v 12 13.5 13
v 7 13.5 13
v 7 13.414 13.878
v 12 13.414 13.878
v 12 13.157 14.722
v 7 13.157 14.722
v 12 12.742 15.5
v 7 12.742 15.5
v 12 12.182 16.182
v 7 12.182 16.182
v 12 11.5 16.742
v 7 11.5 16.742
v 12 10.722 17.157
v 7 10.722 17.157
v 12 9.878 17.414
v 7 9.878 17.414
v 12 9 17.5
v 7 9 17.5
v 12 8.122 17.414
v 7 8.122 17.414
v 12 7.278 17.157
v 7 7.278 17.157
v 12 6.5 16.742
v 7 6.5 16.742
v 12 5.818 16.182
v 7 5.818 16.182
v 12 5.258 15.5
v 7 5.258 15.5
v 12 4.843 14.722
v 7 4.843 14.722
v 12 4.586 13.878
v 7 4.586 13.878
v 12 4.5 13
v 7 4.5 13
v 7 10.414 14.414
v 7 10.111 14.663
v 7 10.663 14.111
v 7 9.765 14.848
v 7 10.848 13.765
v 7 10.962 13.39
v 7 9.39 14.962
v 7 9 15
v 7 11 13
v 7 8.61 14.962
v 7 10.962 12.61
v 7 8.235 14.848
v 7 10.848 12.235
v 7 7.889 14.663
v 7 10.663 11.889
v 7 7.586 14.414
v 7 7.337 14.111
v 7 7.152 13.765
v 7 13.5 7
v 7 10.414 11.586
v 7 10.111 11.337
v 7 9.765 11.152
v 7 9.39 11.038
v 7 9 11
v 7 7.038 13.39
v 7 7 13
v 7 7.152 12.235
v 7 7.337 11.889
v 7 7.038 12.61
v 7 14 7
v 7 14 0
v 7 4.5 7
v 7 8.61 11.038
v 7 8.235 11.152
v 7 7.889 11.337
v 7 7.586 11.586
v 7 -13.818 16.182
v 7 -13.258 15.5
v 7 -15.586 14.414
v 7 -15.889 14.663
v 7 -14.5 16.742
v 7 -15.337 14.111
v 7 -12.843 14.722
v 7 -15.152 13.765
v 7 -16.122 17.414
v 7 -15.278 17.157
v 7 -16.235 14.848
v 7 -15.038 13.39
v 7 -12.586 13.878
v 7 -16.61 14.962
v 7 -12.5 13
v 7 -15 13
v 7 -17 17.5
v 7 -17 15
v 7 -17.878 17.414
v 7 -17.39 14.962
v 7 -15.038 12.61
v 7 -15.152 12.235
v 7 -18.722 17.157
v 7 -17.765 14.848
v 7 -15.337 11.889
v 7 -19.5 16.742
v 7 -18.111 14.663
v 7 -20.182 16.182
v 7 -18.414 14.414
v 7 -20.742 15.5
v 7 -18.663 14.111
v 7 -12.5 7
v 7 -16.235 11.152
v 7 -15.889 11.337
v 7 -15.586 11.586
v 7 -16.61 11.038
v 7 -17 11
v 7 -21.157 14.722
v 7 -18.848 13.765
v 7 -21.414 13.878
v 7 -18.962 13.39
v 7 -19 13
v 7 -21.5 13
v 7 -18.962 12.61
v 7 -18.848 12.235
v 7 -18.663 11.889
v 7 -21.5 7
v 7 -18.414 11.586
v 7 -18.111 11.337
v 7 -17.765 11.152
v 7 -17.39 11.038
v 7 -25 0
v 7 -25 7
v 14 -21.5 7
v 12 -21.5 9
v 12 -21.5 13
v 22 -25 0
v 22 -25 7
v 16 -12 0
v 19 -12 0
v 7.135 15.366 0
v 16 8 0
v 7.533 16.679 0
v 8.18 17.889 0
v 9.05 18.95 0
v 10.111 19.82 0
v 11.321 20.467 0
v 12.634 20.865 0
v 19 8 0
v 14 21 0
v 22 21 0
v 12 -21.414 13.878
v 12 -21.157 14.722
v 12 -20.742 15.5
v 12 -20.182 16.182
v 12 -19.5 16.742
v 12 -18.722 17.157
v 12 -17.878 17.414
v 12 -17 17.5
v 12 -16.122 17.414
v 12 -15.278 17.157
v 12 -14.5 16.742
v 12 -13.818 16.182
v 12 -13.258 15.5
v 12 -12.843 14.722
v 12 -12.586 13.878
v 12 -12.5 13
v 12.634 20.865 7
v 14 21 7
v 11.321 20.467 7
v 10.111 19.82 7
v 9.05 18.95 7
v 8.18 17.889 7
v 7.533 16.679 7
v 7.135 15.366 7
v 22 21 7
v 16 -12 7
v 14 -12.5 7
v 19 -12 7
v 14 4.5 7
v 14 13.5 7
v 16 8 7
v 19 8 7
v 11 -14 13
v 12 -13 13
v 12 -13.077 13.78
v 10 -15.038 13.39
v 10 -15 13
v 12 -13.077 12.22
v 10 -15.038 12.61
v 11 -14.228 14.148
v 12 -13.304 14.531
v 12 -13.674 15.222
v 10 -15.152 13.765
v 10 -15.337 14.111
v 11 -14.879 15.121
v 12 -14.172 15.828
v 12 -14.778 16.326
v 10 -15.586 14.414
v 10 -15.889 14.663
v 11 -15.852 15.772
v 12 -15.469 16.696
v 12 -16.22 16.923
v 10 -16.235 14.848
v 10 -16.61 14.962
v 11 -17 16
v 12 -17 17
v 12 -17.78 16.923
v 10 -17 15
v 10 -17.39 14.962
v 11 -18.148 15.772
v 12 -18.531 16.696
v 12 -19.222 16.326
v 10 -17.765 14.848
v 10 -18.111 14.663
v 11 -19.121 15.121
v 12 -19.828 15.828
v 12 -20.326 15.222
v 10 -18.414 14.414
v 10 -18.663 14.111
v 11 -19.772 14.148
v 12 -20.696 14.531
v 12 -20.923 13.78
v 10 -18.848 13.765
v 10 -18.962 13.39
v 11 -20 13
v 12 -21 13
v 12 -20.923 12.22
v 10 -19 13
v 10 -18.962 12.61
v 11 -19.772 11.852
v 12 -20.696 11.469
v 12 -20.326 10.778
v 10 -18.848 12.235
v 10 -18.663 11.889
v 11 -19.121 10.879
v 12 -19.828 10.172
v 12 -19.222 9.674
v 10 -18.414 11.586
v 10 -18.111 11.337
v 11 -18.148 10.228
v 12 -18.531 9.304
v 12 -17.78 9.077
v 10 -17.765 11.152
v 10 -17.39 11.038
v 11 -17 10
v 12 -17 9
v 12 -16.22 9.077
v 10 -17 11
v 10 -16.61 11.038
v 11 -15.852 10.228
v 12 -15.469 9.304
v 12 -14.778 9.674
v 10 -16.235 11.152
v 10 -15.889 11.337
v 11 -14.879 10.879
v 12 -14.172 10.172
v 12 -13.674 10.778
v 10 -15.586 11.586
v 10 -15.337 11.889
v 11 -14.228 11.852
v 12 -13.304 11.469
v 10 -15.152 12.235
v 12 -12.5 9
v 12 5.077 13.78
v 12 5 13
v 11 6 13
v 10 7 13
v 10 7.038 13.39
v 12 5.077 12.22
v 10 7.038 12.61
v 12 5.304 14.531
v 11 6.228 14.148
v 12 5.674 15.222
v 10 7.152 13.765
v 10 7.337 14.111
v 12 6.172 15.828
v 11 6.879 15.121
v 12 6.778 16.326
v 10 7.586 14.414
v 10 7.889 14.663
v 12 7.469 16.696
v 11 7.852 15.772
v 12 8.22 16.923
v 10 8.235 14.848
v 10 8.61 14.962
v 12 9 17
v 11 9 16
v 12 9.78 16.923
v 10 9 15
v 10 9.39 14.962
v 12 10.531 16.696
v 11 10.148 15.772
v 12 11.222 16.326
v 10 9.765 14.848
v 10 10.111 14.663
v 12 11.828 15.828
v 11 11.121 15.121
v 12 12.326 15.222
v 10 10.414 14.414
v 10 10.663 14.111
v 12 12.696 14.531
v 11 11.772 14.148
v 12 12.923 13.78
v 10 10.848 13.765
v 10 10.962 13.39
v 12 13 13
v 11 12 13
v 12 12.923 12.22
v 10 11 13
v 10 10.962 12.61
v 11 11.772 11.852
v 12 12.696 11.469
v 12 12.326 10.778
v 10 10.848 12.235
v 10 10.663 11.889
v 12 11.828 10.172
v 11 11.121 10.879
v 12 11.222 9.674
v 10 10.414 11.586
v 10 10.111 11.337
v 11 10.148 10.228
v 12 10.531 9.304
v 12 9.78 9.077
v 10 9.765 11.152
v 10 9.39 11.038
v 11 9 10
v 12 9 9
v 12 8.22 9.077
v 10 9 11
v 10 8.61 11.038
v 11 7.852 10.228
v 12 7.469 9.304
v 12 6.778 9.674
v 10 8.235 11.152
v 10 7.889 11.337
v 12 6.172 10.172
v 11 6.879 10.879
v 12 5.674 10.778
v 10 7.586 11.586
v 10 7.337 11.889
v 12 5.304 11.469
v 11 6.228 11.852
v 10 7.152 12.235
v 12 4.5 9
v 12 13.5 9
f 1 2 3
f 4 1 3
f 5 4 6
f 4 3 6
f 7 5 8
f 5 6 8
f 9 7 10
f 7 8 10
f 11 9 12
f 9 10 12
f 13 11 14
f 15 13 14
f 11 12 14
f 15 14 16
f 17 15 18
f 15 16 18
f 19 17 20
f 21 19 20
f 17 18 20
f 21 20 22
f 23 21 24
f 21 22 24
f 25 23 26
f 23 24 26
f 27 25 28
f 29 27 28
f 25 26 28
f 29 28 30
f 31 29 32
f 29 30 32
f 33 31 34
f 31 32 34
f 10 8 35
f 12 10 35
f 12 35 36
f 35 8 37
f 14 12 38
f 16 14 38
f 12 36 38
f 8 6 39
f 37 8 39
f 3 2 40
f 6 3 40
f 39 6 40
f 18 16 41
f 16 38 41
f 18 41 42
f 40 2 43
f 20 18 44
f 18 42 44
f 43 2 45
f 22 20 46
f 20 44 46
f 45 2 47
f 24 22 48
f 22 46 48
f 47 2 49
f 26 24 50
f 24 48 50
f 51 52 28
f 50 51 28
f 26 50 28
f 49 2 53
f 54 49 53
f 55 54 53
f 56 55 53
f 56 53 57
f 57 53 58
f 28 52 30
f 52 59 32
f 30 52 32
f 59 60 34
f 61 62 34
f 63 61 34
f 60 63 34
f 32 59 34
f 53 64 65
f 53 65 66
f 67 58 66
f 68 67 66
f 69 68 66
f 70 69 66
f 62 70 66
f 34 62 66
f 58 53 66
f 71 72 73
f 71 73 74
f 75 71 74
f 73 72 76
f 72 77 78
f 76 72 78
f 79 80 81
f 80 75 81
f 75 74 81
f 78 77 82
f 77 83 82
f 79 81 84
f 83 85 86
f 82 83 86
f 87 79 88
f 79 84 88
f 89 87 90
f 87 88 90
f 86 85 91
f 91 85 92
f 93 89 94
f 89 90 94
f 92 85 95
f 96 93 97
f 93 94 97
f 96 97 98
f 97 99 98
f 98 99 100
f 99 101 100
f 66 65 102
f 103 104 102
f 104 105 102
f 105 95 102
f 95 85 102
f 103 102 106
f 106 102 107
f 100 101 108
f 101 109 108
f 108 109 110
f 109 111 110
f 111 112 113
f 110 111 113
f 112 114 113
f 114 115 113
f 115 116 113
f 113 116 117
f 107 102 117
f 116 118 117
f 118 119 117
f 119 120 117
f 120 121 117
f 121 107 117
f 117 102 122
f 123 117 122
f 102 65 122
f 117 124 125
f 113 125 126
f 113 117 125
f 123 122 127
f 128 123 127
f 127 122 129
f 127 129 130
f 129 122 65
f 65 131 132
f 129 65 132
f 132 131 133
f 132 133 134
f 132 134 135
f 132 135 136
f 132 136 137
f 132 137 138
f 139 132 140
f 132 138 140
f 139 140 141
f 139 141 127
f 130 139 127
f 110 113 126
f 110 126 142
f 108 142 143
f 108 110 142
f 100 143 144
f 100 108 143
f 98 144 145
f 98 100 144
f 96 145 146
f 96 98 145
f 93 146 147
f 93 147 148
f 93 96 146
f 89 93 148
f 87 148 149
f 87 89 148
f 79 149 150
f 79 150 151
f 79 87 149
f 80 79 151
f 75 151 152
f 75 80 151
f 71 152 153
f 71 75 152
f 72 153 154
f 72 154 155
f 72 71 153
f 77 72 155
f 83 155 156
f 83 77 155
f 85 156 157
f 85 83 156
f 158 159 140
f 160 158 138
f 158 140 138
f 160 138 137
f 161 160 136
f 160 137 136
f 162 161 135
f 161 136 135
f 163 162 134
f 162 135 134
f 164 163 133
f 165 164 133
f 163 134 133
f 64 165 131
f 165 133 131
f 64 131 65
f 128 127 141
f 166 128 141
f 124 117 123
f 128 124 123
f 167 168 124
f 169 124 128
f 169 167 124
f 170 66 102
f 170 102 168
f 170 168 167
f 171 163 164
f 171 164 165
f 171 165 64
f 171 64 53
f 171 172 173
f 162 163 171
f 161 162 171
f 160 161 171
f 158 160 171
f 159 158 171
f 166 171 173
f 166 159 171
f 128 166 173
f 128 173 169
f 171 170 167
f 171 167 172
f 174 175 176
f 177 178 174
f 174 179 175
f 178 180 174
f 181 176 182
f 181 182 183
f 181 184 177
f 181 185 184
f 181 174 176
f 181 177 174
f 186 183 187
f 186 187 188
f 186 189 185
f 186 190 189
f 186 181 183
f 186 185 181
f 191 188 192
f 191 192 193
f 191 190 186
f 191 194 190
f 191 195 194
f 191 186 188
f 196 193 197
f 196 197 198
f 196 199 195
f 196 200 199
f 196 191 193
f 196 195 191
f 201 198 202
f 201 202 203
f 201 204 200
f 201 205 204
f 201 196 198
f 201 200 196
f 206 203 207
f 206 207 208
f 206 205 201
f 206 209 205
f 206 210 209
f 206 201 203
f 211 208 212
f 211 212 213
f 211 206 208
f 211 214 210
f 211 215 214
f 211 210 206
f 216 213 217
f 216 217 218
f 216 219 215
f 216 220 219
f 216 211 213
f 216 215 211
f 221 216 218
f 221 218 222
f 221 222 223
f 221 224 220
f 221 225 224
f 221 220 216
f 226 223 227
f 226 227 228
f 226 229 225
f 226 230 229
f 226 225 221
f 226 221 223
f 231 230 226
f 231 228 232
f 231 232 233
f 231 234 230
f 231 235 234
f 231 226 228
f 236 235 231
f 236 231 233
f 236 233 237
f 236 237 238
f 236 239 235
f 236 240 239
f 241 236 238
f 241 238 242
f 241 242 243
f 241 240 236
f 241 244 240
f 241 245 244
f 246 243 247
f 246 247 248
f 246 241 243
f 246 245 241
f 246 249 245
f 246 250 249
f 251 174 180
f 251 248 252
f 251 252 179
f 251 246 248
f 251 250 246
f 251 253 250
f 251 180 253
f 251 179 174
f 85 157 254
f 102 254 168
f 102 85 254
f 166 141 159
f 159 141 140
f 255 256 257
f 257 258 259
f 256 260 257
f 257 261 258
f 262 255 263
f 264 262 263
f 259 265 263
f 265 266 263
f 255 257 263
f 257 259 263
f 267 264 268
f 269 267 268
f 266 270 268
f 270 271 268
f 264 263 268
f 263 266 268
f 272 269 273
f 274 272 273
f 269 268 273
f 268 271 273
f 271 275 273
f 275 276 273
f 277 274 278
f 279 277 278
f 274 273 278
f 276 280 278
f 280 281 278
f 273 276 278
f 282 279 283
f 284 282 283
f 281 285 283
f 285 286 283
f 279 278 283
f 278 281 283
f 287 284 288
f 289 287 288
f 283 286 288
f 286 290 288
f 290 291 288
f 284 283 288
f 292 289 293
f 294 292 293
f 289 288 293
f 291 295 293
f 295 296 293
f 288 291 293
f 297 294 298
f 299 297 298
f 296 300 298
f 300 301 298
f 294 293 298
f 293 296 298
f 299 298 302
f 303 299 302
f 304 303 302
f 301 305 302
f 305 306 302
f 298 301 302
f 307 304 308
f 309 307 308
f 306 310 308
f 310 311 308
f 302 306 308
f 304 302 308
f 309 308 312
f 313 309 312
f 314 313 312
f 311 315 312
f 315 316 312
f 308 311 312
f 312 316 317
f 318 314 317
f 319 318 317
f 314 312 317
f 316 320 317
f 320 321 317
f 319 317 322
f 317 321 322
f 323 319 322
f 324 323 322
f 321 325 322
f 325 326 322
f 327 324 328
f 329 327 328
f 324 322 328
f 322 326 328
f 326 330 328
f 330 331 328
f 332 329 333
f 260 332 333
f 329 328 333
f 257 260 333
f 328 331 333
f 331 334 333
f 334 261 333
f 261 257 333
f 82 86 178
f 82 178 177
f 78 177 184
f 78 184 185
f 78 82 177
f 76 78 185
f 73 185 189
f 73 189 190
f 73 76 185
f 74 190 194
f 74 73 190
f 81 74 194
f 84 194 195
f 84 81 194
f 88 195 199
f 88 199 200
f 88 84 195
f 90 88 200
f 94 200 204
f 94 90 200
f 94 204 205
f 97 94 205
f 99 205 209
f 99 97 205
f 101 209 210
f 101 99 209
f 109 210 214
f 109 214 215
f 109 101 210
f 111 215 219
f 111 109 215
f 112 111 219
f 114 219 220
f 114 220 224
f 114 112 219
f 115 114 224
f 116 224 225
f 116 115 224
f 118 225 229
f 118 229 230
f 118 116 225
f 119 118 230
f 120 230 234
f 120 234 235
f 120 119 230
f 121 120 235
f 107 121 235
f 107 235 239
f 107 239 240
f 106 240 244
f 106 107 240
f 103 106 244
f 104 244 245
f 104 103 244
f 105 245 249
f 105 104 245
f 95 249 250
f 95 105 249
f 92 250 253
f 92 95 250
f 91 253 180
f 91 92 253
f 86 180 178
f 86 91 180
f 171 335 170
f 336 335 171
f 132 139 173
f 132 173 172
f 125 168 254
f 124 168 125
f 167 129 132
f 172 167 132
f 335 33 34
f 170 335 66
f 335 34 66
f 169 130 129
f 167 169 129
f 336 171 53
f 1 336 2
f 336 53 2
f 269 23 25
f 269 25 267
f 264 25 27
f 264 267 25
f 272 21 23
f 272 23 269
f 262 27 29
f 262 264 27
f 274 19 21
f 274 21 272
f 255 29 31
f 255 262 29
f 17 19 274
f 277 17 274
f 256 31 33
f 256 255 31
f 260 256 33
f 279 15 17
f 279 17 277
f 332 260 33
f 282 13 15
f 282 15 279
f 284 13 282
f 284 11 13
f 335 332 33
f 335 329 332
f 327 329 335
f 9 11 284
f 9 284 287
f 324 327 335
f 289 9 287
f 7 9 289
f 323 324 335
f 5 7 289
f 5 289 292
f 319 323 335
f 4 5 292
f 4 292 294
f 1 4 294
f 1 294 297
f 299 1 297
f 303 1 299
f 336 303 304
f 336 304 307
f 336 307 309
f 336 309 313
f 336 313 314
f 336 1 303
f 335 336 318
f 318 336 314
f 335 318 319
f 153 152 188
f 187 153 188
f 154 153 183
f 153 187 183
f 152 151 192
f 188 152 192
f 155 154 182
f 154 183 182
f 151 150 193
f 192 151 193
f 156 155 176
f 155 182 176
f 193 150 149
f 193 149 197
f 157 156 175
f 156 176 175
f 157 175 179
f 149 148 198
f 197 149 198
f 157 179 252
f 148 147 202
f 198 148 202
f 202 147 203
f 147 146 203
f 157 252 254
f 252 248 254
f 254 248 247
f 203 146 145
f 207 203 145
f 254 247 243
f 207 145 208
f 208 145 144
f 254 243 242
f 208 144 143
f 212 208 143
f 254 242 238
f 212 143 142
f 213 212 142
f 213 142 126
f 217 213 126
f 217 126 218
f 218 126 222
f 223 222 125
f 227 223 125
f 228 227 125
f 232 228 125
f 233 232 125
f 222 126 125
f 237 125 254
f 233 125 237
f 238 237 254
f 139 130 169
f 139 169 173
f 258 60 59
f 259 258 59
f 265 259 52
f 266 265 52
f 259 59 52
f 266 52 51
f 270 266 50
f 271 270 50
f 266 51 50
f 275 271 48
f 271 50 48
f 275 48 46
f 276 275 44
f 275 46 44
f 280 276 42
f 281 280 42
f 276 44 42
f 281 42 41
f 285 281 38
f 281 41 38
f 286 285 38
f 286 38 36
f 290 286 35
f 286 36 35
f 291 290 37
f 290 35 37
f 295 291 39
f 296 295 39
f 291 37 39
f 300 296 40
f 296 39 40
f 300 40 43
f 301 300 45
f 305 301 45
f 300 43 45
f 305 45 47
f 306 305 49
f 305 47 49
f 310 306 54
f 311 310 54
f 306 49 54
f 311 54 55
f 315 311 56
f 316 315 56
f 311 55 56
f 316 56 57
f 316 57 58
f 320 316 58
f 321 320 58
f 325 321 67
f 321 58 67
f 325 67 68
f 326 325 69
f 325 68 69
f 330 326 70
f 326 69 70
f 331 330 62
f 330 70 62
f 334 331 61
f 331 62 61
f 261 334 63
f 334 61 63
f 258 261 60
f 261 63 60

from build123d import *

# Parameters (mm, degrees)
BOSS_EXTRUDE1_DEPTH = 7
SKETCH2_R           = 2
BOSS_EXTRUDE2_DEPTH = 5
CHAMFER1_SIZE       = 2
CHAMFER2_SIZE       = 2
SKETCH3_W           = 3
SKETCH3_H           = 20
CUT_EXTRUDE1_DEPTH  = 38.619808612


with BuildPart() as part:
    # Sketch1 → Boss-Extrude1 (new body)
    with BuildSketch(Plane.XY):
        with BuildLine():
            Line((22, 21), (14, 21))
            ThreePointArc((14, 21), (9.050252532, 18.949747468), (7, 14))
            Line((7, 14), (7, -25))
            Line((7, -25), (22, -25))
            Line((22, -25), (22, 21))
        make_face()
    extrude(amount=BOSS_EXTRUDE1_DEPTH)

    # Sketch2 → Boss-Extrude2 (add)
    with BuildSketch(Plane.ZY.offset(-7)):
        with BuildLine():
            Line((7, 13.5), (13, 13.5))
            ThreePointArc((13, 13.5), (17.5, 9), (13, 4.5))
            Line((13, 4.5), (7, 4.5))
            Line((7, 4.5), (7, 13.5))
        make_face()
        with Locations(Location((13, 9, 0), (0, 0, 270))):
            Circle(SKETCH2_R, mode=Mode.SUBTRACT)
    boss_extrude2 = extrude(amount=-BOSS_EXTRUDE2_DEPTH)

    # Mirror1: Boss-Extrude2 across plane
    add(boss_extrude2.mirror(Plane.ZX.offset(-4)))

    # Chamfer1
    chamfer1_edges = [part.edges().sort_by_distance(p)[0] for p in [
        (12, 11, 13),
        (12, -19, 13),
    ]]
    chamfer(chamfer1_edges, length=CHAMFER1_SIZE)

    # Chamfer2
    chamfer2_edges = [part.edges().sort_by_distance(p)[0] for p in [
        (12, 9, 7),
        (12, -17, 7),
    ]]
    chamfer(chamfer2_edges, length=CHAMFER2_SIZE - 0.0001)  # a hair under: the kernel refuses the full size

    # Sketch3 → Cut-Extrude1 (cut, through all)
    with BuildSketch(Plane(origin=(0, 0, 0), x_dir=(-1, 0, 0), z_dir=(0, 0, -1))):
        with Locations((-17.5, -2)):
            Rectangle(SKETCH3_W, SKETCH3_H)
    extrude(amount=-CUT_EXTRUDE1_DEPTH, mode=Mode.SUBTRACT)


solid = part.part
